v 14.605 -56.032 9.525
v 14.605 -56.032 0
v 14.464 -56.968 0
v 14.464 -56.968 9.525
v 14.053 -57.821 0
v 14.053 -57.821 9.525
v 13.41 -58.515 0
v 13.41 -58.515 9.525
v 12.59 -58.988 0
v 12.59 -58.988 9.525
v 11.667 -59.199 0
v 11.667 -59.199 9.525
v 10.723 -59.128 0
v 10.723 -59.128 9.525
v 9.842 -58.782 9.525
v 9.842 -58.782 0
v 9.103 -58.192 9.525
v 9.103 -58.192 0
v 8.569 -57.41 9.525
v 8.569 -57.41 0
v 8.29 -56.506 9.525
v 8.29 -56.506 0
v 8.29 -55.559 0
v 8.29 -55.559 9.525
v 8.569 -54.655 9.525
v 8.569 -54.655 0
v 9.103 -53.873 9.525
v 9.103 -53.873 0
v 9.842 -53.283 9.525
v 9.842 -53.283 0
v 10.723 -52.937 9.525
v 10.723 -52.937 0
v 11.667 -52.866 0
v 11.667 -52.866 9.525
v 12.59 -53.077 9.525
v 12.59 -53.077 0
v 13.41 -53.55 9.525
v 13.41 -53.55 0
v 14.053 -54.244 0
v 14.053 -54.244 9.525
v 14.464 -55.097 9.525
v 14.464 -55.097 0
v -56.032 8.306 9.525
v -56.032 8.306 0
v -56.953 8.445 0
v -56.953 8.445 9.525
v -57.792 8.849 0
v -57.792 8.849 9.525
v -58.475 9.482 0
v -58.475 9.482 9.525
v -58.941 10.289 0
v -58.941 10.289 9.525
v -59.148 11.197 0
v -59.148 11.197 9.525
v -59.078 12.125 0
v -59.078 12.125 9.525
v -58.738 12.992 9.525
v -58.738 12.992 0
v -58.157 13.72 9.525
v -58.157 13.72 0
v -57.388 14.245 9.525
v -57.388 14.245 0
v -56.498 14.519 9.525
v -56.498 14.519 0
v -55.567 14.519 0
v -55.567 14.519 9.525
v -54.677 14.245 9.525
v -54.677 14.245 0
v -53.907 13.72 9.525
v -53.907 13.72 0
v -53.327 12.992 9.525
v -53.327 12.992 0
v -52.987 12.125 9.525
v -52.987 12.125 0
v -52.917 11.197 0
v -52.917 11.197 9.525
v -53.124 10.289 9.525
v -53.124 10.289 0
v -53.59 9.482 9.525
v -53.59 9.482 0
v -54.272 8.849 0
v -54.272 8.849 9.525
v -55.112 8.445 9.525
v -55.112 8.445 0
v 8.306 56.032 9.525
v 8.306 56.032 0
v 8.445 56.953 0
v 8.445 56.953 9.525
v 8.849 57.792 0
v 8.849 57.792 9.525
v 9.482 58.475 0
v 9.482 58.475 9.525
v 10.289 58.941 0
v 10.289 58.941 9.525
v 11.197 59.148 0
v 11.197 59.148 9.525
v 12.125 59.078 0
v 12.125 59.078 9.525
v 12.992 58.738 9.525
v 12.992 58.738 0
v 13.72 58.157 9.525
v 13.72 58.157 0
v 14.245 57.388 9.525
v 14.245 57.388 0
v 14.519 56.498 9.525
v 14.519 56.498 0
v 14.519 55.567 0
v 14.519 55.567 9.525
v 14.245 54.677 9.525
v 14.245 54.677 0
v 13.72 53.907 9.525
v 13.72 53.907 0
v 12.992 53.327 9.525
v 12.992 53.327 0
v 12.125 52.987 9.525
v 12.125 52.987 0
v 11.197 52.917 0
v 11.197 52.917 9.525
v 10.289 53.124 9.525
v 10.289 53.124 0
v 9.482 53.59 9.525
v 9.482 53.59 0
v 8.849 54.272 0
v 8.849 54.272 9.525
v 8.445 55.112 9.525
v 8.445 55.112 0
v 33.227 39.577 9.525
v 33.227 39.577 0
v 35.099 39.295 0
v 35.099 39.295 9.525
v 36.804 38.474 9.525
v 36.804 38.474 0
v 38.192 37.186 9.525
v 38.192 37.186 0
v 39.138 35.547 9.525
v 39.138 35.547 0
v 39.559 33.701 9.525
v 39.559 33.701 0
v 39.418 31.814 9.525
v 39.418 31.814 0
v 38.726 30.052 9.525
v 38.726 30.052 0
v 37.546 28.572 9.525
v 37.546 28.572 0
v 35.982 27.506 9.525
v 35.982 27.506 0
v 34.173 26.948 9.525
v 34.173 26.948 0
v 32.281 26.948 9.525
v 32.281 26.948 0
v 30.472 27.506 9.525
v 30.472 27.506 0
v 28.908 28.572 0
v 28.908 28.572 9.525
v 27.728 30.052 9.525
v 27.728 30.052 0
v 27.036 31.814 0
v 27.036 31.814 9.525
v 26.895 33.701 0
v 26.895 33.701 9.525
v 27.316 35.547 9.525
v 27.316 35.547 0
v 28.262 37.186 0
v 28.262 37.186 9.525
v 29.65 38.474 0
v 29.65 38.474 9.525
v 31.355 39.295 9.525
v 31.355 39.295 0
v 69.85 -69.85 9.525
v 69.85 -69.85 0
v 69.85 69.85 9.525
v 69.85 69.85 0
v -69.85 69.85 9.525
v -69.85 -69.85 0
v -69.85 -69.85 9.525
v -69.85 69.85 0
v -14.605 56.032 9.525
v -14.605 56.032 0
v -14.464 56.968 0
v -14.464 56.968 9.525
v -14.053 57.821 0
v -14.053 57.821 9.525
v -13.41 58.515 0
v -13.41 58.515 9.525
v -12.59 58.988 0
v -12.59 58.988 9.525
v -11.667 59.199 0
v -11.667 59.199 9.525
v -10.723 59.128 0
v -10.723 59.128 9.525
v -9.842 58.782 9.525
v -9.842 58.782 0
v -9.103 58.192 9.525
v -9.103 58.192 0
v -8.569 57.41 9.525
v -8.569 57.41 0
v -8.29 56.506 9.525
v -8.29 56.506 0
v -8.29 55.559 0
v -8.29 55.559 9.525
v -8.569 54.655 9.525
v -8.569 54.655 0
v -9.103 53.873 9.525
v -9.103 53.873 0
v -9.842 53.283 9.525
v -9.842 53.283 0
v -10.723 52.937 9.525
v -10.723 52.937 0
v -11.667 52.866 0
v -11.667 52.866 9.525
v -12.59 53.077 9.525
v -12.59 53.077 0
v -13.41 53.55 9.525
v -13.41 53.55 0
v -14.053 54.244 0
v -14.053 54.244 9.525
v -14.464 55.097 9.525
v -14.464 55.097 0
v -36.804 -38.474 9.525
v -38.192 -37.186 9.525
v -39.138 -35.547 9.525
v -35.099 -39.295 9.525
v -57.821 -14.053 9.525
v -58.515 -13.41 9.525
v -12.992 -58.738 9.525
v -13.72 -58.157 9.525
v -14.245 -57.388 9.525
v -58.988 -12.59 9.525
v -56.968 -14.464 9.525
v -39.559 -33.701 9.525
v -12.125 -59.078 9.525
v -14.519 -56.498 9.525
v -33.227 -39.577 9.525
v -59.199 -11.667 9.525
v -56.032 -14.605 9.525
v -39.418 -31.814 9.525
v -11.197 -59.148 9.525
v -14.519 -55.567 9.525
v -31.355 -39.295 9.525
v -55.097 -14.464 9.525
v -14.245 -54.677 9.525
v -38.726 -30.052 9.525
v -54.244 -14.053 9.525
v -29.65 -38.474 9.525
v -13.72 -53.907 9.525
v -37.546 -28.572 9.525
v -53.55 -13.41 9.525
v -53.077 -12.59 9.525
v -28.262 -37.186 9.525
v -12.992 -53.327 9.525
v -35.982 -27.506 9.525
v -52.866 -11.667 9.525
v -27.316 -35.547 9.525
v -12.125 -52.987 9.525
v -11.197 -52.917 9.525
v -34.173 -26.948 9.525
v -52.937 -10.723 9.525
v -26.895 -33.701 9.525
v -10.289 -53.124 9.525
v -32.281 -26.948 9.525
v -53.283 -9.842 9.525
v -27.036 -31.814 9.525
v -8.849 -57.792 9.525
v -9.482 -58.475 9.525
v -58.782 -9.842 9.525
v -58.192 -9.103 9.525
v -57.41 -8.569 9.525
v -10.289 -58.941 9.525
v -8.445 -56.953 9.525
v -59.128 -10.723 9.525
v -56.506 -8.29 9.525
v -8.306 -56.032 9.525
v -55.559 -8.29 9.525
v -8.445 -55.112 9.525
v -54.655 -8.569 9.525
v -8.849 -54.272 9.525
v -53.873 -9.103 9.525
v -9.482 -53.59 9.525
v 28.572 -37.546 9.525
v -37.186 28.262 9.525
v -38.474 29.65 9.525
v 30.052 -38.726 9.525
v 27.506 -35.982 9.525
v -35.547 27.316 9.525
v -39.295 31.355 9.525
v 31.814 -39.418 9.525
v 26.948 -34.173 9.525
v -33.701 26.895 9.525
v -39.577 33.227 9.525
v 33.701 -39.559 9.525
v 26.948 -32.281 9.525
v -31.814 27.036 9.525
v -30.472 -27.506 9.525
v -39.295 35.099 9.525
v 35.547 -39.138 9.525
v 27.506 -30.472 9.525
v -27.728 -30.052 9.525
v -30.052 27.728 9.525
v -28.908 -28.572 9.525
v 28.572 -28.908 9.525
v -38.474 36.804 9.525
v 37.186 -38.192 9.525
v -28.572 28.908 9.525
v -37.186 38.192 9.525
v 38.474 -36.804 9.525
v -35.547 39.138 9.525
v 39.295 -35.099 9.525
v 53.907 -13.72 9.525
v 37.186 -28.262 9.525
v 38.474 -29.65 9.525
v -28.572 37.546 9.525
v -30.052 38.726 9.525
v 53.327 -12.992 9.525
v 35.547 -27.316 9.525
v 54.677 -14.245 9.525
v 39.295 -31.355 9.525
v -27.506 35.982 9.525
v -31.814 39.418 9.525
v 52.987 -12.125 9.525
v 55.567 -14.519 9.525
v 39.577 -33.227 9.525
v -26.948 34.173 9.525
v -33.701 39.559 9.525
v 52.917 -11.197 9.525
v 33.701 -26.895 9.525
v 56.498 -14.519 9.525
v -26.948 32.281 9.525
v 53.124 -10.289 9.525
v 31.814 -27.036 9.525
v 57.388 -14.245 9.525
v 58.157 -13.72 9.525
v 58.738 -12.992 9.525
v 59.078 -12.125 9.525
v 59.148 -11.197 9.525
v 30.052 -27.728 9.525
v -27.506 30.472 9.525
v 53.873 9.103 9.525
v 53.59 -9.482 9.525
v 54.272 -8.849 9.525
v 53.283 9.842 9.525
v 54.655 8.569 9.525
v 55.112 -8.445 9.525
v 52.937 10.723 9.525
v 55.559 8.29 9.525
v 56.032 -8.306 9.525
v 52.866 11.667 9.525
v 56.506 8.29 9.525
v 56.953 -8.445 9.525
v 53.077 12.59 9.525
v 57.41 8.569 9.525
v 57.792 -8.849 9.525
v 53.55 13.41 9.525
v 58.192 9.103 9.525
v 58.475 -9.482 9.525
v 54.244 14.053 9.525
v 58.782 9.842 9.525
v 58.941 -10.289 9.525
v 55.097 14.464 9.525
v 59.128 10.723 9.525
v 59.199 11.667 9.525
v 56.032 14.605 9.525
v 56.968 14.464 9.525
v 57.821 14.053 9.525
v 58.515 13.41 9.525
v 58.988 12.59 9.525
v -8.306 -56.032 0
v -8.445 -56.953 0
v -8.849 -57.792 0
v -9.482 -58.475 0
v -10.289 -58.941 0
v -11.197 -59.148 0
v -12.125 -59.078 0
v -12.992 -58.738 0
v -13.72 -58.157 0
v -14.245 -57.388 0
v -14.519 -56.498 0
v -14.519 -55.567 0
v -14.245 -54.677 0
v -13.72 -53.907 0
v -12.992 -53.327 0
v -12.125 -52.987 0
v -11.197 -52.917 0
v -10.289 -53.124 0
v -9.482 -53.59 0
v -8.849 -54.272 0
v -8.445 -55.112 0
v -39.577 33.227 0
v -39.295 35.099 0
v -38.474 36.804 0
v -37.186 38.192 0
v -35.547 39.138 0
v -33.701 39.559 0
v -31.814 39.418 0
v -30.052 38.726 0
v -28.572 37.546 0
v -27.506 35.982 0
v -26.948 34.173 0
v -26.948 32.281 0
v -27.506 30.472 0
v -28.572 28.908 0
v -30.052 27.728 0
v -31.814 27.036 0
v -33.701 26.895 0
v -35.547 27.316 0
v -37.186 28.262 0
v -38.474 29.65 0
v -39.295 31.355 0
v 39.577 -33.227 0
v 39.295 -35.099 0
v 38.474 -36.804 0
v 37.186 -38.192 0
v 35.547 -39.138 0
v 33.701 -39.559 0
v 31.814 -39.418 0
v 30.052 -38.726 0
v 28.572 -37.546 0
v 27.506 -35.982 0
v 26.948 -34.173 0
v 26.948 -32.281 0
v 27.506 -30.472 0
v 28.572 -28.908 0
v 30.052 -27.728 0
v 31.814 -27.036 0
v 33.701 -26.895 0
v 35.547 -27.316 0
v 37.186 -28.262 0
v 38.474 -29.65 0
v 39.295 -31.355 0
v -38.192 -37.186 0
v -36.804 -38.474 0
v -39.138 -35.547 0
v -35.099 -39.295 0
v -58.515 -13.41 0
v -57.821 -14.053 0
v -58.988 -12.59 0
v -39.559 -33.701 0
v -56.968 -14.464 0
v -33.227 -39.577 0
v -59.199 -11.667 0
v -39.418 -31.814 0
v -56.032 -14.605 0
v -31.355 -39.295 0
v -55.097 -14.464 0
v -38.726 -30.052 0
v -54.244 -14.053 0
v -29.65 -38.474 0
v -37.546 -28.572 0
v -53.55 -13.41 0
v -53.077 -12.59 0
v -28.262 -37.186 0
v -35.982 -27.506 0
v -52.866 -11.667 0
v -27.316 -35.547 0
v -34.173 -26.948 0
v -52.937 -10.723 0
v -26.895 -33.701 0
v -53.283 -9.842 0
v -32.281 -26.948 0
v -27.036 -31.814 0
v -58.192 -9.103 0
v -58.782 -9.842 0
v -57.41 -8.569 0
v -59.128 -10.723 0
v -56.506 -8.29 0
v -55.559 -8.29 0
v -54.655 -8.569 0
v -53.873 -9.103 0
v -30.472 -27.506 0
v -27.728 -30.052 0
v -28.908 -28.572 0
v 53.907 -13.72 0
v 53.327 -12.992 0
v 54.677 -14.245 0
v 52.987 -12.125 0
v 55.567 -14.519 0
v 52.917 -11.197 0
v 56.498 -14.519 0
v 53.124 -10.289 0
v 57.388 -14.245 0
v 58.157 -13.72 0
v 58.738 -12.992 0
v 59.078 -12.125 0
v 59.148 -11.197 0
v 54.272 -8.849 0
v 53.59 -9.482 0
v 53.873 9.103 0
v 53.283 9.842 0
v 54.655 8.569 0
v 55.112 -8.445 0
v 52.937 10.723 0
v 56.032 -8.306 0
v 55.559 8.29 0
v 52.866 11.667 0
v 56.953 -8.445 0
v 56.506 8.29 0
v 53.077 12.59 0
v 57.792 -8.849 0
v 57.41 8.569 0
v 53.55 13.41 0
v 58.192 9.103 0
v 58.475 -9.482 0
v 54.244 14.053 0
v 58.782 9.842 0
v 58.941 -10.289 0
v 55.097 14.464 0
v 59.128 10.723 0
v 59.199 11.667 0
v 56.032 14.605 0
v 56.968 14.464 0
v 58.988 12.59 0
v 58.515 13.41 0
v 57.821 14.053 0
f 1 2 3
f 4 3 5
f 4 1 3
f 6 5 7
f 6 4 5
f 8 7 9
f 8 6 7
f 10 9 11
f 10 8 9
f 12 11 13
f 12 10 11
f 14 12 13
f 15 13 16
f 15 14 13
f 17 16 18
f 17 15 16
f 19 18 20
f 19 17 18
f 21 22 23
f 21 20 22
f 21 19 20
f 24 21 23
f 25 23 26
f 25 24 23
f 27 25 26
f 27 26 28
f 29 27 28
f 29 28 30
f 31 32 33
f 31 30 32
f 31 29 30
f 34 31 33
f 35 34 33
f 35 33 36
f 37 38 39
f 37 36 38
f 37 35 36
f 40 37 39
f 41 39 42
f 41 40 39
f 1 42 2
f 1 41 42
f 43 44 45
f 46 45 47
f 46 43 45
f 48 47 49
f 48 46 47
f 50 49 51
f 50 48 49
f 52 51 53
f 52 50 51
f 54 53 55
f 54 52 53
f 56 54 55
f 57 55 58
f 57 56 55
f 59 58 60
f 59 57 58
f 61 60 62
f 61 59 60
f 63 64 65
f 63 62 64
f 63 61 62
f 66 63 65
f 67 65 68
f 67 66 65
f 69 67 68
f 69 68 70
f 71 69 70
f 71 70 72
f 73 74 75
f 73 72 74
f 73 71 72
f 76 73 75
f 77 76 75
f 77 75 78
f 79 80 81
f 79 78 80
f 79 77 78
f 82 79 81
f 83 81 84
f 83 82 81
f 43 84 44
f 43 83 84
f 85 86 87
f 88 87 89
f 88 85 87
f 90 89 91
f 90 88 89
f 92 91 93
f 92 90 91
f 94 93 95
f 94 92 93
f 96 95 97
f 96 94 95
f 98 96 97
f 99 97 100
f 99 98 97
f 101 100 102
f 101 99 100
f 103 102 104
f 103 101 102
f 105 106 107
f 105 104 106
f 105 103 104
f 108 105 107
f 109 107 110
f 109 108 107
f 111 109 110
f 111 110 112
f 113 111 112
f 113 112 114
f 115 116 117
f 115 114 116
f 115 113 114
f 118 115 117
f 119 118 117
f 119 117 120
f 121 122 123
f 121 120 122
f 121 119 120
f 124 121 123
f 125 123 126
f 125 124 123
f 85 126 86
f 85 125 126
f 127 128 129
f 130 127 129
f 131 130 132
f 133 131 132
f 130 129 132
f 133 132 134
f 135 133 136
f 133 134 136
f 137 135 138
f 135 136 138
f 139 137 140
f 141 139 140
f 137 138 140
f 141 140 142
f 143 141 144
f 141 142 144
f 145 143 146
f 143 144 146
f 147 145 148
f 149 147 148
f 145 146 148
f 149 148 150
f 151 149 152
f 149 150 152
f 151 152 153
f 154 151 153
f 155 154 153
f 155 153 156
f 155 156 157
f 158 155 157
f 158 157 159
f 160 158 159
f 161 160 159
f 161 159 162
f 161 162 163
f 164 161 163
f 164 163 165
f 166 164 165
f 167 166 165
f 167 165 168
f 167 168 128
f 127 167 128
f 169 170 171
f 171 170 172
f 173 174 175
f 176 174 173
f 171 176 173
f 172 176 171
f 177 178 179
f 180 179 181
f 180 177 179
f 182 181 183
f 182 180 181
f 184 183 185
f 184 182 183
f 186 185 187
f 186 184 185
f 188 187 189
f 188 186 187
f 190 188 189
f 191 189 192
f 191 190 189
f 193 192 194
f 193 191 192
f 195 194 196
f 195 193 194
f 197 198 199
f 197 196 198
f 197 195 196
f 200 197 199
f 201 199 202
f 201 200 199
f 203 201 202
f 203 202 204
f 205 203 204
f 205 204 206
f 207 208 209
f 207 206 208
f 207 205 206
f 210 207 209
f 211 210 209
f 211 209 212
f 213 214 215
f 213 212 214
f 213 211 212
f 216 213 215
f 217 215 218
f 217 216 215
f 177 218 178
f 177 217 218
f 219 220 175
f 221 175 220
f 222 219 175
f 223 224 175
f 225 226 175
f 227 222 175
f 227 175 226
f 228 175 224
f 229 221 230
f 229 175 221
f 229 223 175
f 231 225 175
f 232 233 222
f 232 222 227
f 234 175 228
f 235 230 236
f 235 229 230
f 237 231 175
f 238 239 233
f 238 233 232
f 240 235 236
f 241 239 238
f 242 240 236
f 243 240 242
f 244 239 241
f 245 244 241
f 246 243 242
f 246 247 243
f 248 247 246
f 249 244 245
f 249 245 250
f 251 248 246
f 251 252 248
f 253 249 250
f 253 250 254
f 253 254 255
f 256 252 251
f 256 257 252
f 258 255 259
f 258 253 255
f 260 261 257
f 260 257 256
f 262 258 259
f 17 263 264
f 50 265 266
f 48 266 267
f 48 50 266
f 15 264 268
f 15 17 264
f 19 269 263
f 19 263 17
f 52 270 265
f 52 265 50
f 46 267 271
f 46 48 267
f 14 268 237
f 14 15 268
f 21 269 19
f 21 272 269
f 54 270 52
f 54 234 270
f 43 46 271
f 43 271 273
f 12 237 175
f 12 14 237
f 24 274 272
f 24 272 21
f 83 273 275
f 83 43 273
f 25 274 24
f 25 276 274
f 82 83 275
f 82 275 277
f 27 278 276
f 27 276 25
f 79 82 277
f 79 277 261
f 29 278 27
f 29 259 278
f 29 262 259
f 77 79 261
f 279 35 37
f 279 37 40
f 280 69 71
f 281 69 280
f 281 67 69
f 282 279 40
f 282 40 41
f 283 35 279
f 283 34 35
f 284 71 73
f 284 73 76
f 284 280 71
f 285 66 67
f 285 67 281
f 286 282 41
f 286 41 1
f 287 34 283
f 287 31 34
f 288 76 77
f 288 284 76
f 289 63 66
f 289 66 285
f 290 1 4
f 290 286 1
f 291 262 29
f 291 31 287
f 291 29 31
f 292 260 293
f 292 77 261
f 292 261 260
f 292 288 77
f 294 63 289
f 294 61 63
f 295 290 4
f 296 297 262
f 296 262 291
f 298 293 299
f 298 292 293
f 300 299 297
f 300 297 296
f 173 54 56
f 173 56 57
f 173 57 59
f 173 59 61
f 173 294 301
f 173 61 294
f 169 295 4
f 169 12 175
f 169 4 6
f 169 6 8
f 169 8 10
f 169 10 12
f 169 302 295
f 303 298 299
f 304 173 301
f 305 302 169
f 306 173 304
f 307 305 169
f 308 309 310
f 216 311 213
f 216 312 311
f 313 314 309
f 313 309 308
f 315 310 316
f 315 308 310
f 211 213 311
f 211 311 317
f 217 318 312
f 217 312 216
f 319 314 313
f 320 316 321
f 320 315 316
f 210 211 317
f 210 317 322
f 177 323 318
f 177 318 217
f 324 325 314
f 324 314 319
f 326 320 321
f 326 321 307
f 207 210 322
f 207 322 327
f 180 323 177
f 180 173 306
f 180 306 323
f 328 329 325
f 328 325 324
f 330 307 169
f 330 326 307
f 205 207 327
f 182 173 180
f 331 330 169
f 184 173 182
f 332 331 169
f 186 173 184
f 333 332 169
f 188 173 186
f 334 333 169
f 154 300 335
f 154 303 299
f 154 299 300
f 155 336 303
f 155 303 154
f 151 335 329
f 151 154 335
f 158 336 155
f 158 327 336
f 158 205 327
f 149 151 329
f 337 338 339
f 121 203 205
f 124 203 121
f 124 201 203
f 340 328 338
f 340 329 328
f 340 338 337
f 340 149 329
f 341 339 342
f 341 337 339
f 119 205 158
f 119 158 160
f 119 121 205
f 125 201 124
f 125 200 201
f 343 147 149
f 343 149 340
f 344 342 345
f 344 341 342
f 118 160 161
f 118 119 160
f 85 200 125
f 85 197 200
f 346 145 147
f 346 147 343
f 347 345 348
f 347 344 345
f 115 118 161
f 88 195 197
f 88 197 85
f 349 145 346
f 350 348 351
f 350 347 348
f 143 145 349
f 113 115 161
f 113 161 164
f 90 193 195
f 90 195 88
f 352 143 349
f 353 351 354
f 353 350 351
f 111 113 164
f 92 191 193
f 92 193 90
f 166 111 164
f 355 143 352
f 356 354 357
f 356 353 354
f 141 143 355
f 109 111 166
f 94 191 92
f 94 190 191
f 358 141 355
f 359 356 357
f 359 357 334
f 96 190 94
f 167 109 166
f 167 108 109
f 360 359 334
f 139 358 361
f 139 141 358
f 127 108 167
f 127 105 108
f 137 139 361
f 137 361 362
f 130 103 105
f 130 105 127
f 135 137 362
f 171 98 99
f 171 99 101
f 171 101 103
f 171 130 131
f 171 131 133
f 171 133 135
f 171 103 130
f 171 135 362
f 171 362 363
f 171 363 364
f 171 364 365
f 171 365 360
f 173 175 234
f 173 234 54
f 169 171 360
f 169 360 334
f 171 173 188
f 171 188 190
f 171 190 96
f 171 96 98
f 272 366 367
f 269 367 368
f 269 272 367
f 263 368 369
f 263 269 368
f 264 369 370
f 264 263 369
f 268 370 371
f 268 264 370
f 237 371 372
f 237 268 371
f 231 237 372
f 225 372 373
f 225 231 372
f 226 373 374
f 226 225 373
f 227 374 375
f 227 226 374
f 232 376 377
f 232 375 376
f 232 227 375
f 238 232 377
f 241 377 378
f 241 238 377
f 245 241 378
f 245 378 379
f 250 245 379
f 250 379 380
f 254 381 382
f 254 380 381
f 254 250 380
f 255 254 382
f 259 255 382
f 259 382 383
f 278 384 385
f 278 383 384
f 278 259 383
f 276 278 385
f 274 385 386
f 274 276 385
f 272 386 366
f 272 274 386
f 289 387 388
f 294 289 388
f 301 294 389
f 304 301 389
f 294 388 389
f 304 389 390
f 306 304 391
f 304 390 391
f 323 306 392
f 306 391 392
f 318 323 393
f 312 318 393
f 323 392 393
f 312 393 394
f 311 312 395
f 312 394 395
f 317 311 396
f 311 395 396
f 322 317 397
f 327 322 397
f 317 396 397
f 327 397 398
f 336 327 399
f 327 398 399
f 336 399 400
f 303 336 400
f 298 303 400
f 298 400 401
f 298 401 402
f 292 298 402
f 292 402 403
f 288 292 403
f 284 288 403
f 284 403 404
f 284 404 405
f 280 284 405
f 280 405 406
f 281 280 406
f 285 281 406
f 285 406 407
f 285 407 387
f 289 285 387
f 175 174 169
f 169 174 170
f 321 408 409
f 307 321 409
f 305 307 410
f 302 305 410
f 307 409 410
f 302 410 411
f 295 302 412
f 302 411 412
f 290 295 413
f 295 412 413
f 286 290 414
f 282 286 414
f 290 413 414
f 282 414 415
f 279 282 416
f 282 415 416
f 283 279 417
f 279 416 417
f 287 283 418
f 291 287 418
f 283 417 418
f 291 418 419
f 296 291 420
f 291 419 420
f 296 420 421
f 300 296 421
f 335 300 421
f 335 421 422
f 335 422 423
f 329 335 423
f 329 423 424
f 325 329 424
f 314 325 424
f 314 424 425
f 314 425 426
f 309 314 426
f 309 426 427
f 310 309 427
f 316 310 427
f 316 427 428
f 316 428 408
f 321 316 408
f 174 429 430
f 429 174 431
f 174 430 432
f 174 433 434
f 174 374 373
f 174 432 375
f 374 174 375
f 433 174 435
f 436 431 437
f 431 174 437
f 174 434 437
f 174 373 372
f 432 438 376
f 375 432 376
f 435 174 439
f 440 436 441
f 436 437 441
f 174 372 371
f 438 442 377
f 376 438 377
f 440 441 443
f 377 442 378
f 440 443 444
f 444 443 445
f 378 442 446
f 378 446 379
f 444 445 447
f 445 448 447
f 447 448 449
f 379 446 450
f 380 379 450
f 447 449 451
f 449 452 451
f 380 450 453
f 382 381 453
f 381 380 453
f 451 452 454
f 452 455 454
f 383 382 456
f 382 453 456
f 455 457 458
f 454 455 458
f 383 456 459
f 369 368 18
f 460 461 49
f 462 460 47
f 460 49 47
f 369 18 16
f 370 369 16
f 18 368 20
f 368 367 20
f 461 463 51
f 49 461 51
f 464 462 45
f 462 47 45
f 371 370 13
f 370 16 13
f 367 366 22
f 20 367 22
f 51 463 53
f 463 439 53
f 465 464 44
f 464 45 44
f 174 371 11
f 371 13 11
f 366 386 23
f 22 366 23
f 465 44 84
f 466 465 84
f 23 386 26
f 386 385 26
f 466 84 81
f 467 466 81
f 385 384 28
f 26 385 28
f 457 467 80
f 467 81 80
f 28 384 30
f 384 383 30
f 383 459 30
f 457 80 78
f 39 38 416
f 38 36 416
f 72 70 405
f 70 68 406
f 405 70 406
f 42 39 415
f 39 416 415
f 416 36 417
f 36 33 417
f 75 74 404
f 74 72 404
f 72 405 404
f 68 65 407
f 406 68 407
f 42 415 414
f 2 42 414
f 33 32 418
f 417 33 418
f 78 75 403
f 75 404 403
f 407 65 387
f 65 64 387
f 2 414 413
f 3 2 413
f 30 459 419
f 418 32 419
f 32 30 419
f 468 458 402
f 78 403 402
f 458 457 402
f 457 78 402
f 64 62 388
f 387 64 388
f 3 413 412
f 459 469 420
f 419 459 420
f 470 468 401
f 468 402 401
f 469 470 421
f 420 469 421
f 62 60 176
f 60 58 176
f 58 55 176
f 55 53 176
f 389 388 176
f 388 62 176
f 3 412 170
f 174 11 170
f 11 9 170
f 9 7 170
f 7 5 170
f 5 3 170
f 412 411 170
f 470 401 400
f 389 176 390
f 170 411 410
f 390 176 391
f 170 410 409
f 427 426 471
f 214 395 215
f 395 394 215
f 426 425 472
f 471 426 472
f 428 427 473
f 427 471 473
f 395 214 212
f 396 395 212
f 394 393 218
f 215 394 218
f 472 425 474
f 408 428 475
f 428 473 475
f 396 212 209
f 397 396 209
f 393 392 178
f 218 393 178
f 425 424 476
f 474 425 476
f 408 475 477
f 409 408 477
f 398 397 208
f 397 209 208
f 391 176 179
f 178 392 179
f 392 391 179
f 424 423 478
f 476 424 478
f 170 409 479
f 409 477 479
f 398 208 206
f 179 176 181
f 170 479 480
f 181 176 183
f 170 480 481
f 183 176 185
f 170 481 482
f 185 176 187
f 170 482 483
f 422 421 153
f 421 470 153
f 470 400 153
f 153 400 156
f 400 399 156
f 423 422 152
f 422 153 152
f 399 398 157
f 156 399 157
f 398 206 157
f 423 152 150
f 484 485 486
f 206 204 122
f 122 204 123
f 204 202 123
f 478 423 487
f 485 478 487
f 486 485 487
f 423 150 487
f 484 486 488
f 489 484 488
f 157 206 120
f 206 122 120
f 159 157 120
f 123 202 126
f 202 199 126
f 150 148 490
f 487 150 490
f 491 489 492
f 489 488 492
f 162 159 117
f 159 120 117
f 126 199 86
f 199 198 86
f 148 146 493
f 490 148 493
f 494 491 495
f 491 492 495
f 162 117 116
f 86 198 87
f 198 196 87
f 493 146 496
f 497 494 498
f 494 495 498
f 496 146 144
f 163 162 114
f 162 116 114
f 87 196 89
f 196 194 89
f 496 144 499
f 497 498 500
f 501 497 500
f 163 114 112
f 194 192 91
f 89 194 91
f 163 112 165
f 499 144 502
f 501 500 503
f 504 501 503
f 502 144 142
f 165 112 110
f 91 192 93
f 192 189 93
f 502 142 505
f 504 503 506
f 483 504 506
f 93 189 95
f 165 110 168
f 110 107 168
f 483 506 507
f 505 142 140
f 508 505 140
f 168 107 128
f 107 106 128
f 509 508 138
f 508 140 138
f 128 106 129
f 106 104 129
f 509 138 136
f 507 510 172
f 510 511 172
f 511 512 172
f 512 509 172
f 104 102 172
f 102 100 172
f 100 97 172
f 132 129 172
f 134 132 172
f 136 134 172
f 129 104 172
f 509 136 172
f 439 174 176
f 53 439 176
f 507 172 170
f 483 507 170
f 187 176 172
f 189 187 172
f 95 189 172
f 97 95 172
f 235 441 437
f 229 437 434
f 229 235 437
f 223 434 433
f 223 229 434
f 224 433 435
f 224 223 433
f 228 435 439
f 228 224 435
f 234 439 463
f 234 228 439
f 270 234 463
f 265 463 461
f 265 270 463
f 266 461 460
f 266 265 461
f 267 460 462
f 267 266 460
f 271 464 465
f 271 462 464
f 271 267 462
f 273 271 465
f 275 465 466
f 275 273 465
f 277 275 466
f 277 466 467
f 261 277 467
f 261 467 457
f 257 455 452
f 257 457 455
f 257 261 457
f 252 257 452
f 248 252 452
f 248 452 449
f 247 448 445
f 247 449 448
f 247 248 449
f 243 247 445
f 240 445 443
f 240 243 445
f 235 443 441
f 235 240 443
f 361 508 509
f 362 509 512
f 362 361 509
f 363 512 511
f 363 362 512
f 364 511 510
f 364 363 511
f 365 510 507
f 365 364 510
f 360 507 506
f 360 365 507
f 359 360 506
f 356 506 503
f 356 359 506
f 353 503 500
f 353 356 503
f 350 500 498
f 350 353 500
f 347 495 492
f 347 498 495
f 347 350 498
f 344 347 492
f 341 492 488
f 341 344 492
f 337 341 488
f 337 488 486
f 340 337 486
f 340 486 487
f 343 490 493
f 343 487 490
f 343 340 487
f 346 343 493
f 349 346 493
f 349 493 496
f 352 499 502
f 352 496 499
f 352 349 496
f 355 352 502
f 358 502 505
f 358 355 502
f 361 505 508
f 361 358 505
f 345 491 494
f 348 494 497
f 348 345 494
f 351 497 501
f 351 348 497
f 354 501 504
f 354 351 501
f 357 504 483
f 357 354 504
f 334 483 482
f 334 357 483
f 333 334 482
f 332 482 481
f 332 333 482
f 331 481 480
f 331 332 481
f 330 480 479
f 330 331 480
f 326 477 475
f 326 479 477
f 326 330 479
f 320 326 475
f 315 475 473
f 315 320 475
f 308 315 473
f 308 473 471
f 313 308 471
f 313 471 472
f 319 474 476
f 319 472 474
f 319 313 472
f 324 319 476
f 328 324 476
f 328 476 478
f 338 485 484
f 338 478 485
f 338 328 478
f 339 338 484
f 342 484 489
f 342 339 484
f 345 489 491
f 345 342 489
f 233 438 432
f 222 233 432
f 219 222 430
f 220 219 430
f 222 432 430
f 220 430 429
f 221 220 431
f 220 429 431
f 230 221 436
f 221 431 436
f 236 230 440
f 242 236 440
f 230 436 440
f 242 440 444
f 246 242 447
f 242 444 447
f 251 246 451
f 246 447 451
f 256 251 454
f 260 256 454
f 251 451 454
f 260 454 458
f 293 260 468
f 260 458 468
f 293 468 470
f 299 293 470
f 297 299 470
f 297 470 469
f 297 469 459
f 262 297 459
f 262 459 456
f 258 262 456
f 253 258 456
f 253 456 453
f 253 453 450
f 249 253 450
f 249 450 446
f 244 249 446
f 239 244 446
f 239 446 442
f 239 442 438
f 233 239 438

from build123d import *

# Parameters (mm, degrees)
SKETCH1_W                  = 139.7
SKETCH1_H                  = 139.7
EXTRUDE1_DEPTH             = 9.525
F_1_2_0_5_DIAMETER_HOLE1_D = 12.7
CIRPATTERN1_COUNT          = 4


with BuildPart() as part:
    # Sketch1 → Extrude1 (new body)
    with BuildSketch(Plane.XY):
        Rectangle(SKETCH1_W, SKETCH1_H)
    extrude(amount=EXTRUDE1_DEPTH)

    # 1/2 (0.5) Diameter Hole1 (through all)
    with Locations(Plane(origin=(-33.226947648, 33.226947648, 9.525), x_dir=(1, 0, 0), z_dir=(0, 0, 1))):
        with Locations((0, 0)):
            f_1_2_0_5_diameter_hole1 = Hole(F_1_2_0_5_DIAMETER_HOLE1_D / 2)

    # Sketch4 → D (0.246) Diameter Hole1 (revolve, cut)
    with BuildSketch(Plane(origin=(-56.0324, 11.43, 9.525), x_dir=(0, -1, 0), z_dir=(1, 0, 0))):
        Polygon((0, 0), (0, 35.659208746), (3.1242, 33.782), (3.1242, 0), align=None)
    d_0_246_diameter_hole1 = revolve(axis=Axis((-56.0324, 11.43, 15.875), (0, 0, -1)), mode=Mode.SUBTRACT)

    # Sketch5 → 1/4 (0.25) Diameter Hole1 (revolve, cut)
    with BuildSketch(Plane(origin=(-56.0324, -11.43, 9.525), x_dir=(0, -1, 0), z_dir=(1, 0, 0))):
        Polygon((0, 0), (0, 35.689732465), (3.175, 33.782), (3.175, 0), align=None)
    f_1_4_0_25_diameter_hole1 = revolve(axis=Axis((-56.0324, -11.43, 15.875), (0, 0, -1)), mode=Mode.SUBTRACT)

    # CirPattern1: 1/2 (0.5) Diameter Hole1, D (0.246) Diameter Hole1, 1/4 (0.25) Diameter Hole1 ×4 about axis
    cirpattern1_axis = Axis((0, 0, -0.9525), (0, 0, 1))
    add([f_1_2_0_5_diameter_hole1.rotate(cirpattern1_axis, i * 360 / CIRPATTERN1_COUNT) for i in range(1, CIRPATTERN1_COUNT)], mode=Mode.SUBTRACT)
    add([d_0_246_diameter_hole1.rotate(cirpattern1_axis, i * 360 / CIRPATTERN1_COUNT) for i in range(1, CIRPATTERN1_COUNT)], mode=Mode.SUBTRACT)
    add([f_1_4_0_25_diameter_hole1.rotate(cirpattern1_axis, i * 360 / CIRPATTERN1_COUNT) for i in range(1, CIRPATTERN1_COUNT)], mode=Mode.SUBTRACT)


solid = part.part
